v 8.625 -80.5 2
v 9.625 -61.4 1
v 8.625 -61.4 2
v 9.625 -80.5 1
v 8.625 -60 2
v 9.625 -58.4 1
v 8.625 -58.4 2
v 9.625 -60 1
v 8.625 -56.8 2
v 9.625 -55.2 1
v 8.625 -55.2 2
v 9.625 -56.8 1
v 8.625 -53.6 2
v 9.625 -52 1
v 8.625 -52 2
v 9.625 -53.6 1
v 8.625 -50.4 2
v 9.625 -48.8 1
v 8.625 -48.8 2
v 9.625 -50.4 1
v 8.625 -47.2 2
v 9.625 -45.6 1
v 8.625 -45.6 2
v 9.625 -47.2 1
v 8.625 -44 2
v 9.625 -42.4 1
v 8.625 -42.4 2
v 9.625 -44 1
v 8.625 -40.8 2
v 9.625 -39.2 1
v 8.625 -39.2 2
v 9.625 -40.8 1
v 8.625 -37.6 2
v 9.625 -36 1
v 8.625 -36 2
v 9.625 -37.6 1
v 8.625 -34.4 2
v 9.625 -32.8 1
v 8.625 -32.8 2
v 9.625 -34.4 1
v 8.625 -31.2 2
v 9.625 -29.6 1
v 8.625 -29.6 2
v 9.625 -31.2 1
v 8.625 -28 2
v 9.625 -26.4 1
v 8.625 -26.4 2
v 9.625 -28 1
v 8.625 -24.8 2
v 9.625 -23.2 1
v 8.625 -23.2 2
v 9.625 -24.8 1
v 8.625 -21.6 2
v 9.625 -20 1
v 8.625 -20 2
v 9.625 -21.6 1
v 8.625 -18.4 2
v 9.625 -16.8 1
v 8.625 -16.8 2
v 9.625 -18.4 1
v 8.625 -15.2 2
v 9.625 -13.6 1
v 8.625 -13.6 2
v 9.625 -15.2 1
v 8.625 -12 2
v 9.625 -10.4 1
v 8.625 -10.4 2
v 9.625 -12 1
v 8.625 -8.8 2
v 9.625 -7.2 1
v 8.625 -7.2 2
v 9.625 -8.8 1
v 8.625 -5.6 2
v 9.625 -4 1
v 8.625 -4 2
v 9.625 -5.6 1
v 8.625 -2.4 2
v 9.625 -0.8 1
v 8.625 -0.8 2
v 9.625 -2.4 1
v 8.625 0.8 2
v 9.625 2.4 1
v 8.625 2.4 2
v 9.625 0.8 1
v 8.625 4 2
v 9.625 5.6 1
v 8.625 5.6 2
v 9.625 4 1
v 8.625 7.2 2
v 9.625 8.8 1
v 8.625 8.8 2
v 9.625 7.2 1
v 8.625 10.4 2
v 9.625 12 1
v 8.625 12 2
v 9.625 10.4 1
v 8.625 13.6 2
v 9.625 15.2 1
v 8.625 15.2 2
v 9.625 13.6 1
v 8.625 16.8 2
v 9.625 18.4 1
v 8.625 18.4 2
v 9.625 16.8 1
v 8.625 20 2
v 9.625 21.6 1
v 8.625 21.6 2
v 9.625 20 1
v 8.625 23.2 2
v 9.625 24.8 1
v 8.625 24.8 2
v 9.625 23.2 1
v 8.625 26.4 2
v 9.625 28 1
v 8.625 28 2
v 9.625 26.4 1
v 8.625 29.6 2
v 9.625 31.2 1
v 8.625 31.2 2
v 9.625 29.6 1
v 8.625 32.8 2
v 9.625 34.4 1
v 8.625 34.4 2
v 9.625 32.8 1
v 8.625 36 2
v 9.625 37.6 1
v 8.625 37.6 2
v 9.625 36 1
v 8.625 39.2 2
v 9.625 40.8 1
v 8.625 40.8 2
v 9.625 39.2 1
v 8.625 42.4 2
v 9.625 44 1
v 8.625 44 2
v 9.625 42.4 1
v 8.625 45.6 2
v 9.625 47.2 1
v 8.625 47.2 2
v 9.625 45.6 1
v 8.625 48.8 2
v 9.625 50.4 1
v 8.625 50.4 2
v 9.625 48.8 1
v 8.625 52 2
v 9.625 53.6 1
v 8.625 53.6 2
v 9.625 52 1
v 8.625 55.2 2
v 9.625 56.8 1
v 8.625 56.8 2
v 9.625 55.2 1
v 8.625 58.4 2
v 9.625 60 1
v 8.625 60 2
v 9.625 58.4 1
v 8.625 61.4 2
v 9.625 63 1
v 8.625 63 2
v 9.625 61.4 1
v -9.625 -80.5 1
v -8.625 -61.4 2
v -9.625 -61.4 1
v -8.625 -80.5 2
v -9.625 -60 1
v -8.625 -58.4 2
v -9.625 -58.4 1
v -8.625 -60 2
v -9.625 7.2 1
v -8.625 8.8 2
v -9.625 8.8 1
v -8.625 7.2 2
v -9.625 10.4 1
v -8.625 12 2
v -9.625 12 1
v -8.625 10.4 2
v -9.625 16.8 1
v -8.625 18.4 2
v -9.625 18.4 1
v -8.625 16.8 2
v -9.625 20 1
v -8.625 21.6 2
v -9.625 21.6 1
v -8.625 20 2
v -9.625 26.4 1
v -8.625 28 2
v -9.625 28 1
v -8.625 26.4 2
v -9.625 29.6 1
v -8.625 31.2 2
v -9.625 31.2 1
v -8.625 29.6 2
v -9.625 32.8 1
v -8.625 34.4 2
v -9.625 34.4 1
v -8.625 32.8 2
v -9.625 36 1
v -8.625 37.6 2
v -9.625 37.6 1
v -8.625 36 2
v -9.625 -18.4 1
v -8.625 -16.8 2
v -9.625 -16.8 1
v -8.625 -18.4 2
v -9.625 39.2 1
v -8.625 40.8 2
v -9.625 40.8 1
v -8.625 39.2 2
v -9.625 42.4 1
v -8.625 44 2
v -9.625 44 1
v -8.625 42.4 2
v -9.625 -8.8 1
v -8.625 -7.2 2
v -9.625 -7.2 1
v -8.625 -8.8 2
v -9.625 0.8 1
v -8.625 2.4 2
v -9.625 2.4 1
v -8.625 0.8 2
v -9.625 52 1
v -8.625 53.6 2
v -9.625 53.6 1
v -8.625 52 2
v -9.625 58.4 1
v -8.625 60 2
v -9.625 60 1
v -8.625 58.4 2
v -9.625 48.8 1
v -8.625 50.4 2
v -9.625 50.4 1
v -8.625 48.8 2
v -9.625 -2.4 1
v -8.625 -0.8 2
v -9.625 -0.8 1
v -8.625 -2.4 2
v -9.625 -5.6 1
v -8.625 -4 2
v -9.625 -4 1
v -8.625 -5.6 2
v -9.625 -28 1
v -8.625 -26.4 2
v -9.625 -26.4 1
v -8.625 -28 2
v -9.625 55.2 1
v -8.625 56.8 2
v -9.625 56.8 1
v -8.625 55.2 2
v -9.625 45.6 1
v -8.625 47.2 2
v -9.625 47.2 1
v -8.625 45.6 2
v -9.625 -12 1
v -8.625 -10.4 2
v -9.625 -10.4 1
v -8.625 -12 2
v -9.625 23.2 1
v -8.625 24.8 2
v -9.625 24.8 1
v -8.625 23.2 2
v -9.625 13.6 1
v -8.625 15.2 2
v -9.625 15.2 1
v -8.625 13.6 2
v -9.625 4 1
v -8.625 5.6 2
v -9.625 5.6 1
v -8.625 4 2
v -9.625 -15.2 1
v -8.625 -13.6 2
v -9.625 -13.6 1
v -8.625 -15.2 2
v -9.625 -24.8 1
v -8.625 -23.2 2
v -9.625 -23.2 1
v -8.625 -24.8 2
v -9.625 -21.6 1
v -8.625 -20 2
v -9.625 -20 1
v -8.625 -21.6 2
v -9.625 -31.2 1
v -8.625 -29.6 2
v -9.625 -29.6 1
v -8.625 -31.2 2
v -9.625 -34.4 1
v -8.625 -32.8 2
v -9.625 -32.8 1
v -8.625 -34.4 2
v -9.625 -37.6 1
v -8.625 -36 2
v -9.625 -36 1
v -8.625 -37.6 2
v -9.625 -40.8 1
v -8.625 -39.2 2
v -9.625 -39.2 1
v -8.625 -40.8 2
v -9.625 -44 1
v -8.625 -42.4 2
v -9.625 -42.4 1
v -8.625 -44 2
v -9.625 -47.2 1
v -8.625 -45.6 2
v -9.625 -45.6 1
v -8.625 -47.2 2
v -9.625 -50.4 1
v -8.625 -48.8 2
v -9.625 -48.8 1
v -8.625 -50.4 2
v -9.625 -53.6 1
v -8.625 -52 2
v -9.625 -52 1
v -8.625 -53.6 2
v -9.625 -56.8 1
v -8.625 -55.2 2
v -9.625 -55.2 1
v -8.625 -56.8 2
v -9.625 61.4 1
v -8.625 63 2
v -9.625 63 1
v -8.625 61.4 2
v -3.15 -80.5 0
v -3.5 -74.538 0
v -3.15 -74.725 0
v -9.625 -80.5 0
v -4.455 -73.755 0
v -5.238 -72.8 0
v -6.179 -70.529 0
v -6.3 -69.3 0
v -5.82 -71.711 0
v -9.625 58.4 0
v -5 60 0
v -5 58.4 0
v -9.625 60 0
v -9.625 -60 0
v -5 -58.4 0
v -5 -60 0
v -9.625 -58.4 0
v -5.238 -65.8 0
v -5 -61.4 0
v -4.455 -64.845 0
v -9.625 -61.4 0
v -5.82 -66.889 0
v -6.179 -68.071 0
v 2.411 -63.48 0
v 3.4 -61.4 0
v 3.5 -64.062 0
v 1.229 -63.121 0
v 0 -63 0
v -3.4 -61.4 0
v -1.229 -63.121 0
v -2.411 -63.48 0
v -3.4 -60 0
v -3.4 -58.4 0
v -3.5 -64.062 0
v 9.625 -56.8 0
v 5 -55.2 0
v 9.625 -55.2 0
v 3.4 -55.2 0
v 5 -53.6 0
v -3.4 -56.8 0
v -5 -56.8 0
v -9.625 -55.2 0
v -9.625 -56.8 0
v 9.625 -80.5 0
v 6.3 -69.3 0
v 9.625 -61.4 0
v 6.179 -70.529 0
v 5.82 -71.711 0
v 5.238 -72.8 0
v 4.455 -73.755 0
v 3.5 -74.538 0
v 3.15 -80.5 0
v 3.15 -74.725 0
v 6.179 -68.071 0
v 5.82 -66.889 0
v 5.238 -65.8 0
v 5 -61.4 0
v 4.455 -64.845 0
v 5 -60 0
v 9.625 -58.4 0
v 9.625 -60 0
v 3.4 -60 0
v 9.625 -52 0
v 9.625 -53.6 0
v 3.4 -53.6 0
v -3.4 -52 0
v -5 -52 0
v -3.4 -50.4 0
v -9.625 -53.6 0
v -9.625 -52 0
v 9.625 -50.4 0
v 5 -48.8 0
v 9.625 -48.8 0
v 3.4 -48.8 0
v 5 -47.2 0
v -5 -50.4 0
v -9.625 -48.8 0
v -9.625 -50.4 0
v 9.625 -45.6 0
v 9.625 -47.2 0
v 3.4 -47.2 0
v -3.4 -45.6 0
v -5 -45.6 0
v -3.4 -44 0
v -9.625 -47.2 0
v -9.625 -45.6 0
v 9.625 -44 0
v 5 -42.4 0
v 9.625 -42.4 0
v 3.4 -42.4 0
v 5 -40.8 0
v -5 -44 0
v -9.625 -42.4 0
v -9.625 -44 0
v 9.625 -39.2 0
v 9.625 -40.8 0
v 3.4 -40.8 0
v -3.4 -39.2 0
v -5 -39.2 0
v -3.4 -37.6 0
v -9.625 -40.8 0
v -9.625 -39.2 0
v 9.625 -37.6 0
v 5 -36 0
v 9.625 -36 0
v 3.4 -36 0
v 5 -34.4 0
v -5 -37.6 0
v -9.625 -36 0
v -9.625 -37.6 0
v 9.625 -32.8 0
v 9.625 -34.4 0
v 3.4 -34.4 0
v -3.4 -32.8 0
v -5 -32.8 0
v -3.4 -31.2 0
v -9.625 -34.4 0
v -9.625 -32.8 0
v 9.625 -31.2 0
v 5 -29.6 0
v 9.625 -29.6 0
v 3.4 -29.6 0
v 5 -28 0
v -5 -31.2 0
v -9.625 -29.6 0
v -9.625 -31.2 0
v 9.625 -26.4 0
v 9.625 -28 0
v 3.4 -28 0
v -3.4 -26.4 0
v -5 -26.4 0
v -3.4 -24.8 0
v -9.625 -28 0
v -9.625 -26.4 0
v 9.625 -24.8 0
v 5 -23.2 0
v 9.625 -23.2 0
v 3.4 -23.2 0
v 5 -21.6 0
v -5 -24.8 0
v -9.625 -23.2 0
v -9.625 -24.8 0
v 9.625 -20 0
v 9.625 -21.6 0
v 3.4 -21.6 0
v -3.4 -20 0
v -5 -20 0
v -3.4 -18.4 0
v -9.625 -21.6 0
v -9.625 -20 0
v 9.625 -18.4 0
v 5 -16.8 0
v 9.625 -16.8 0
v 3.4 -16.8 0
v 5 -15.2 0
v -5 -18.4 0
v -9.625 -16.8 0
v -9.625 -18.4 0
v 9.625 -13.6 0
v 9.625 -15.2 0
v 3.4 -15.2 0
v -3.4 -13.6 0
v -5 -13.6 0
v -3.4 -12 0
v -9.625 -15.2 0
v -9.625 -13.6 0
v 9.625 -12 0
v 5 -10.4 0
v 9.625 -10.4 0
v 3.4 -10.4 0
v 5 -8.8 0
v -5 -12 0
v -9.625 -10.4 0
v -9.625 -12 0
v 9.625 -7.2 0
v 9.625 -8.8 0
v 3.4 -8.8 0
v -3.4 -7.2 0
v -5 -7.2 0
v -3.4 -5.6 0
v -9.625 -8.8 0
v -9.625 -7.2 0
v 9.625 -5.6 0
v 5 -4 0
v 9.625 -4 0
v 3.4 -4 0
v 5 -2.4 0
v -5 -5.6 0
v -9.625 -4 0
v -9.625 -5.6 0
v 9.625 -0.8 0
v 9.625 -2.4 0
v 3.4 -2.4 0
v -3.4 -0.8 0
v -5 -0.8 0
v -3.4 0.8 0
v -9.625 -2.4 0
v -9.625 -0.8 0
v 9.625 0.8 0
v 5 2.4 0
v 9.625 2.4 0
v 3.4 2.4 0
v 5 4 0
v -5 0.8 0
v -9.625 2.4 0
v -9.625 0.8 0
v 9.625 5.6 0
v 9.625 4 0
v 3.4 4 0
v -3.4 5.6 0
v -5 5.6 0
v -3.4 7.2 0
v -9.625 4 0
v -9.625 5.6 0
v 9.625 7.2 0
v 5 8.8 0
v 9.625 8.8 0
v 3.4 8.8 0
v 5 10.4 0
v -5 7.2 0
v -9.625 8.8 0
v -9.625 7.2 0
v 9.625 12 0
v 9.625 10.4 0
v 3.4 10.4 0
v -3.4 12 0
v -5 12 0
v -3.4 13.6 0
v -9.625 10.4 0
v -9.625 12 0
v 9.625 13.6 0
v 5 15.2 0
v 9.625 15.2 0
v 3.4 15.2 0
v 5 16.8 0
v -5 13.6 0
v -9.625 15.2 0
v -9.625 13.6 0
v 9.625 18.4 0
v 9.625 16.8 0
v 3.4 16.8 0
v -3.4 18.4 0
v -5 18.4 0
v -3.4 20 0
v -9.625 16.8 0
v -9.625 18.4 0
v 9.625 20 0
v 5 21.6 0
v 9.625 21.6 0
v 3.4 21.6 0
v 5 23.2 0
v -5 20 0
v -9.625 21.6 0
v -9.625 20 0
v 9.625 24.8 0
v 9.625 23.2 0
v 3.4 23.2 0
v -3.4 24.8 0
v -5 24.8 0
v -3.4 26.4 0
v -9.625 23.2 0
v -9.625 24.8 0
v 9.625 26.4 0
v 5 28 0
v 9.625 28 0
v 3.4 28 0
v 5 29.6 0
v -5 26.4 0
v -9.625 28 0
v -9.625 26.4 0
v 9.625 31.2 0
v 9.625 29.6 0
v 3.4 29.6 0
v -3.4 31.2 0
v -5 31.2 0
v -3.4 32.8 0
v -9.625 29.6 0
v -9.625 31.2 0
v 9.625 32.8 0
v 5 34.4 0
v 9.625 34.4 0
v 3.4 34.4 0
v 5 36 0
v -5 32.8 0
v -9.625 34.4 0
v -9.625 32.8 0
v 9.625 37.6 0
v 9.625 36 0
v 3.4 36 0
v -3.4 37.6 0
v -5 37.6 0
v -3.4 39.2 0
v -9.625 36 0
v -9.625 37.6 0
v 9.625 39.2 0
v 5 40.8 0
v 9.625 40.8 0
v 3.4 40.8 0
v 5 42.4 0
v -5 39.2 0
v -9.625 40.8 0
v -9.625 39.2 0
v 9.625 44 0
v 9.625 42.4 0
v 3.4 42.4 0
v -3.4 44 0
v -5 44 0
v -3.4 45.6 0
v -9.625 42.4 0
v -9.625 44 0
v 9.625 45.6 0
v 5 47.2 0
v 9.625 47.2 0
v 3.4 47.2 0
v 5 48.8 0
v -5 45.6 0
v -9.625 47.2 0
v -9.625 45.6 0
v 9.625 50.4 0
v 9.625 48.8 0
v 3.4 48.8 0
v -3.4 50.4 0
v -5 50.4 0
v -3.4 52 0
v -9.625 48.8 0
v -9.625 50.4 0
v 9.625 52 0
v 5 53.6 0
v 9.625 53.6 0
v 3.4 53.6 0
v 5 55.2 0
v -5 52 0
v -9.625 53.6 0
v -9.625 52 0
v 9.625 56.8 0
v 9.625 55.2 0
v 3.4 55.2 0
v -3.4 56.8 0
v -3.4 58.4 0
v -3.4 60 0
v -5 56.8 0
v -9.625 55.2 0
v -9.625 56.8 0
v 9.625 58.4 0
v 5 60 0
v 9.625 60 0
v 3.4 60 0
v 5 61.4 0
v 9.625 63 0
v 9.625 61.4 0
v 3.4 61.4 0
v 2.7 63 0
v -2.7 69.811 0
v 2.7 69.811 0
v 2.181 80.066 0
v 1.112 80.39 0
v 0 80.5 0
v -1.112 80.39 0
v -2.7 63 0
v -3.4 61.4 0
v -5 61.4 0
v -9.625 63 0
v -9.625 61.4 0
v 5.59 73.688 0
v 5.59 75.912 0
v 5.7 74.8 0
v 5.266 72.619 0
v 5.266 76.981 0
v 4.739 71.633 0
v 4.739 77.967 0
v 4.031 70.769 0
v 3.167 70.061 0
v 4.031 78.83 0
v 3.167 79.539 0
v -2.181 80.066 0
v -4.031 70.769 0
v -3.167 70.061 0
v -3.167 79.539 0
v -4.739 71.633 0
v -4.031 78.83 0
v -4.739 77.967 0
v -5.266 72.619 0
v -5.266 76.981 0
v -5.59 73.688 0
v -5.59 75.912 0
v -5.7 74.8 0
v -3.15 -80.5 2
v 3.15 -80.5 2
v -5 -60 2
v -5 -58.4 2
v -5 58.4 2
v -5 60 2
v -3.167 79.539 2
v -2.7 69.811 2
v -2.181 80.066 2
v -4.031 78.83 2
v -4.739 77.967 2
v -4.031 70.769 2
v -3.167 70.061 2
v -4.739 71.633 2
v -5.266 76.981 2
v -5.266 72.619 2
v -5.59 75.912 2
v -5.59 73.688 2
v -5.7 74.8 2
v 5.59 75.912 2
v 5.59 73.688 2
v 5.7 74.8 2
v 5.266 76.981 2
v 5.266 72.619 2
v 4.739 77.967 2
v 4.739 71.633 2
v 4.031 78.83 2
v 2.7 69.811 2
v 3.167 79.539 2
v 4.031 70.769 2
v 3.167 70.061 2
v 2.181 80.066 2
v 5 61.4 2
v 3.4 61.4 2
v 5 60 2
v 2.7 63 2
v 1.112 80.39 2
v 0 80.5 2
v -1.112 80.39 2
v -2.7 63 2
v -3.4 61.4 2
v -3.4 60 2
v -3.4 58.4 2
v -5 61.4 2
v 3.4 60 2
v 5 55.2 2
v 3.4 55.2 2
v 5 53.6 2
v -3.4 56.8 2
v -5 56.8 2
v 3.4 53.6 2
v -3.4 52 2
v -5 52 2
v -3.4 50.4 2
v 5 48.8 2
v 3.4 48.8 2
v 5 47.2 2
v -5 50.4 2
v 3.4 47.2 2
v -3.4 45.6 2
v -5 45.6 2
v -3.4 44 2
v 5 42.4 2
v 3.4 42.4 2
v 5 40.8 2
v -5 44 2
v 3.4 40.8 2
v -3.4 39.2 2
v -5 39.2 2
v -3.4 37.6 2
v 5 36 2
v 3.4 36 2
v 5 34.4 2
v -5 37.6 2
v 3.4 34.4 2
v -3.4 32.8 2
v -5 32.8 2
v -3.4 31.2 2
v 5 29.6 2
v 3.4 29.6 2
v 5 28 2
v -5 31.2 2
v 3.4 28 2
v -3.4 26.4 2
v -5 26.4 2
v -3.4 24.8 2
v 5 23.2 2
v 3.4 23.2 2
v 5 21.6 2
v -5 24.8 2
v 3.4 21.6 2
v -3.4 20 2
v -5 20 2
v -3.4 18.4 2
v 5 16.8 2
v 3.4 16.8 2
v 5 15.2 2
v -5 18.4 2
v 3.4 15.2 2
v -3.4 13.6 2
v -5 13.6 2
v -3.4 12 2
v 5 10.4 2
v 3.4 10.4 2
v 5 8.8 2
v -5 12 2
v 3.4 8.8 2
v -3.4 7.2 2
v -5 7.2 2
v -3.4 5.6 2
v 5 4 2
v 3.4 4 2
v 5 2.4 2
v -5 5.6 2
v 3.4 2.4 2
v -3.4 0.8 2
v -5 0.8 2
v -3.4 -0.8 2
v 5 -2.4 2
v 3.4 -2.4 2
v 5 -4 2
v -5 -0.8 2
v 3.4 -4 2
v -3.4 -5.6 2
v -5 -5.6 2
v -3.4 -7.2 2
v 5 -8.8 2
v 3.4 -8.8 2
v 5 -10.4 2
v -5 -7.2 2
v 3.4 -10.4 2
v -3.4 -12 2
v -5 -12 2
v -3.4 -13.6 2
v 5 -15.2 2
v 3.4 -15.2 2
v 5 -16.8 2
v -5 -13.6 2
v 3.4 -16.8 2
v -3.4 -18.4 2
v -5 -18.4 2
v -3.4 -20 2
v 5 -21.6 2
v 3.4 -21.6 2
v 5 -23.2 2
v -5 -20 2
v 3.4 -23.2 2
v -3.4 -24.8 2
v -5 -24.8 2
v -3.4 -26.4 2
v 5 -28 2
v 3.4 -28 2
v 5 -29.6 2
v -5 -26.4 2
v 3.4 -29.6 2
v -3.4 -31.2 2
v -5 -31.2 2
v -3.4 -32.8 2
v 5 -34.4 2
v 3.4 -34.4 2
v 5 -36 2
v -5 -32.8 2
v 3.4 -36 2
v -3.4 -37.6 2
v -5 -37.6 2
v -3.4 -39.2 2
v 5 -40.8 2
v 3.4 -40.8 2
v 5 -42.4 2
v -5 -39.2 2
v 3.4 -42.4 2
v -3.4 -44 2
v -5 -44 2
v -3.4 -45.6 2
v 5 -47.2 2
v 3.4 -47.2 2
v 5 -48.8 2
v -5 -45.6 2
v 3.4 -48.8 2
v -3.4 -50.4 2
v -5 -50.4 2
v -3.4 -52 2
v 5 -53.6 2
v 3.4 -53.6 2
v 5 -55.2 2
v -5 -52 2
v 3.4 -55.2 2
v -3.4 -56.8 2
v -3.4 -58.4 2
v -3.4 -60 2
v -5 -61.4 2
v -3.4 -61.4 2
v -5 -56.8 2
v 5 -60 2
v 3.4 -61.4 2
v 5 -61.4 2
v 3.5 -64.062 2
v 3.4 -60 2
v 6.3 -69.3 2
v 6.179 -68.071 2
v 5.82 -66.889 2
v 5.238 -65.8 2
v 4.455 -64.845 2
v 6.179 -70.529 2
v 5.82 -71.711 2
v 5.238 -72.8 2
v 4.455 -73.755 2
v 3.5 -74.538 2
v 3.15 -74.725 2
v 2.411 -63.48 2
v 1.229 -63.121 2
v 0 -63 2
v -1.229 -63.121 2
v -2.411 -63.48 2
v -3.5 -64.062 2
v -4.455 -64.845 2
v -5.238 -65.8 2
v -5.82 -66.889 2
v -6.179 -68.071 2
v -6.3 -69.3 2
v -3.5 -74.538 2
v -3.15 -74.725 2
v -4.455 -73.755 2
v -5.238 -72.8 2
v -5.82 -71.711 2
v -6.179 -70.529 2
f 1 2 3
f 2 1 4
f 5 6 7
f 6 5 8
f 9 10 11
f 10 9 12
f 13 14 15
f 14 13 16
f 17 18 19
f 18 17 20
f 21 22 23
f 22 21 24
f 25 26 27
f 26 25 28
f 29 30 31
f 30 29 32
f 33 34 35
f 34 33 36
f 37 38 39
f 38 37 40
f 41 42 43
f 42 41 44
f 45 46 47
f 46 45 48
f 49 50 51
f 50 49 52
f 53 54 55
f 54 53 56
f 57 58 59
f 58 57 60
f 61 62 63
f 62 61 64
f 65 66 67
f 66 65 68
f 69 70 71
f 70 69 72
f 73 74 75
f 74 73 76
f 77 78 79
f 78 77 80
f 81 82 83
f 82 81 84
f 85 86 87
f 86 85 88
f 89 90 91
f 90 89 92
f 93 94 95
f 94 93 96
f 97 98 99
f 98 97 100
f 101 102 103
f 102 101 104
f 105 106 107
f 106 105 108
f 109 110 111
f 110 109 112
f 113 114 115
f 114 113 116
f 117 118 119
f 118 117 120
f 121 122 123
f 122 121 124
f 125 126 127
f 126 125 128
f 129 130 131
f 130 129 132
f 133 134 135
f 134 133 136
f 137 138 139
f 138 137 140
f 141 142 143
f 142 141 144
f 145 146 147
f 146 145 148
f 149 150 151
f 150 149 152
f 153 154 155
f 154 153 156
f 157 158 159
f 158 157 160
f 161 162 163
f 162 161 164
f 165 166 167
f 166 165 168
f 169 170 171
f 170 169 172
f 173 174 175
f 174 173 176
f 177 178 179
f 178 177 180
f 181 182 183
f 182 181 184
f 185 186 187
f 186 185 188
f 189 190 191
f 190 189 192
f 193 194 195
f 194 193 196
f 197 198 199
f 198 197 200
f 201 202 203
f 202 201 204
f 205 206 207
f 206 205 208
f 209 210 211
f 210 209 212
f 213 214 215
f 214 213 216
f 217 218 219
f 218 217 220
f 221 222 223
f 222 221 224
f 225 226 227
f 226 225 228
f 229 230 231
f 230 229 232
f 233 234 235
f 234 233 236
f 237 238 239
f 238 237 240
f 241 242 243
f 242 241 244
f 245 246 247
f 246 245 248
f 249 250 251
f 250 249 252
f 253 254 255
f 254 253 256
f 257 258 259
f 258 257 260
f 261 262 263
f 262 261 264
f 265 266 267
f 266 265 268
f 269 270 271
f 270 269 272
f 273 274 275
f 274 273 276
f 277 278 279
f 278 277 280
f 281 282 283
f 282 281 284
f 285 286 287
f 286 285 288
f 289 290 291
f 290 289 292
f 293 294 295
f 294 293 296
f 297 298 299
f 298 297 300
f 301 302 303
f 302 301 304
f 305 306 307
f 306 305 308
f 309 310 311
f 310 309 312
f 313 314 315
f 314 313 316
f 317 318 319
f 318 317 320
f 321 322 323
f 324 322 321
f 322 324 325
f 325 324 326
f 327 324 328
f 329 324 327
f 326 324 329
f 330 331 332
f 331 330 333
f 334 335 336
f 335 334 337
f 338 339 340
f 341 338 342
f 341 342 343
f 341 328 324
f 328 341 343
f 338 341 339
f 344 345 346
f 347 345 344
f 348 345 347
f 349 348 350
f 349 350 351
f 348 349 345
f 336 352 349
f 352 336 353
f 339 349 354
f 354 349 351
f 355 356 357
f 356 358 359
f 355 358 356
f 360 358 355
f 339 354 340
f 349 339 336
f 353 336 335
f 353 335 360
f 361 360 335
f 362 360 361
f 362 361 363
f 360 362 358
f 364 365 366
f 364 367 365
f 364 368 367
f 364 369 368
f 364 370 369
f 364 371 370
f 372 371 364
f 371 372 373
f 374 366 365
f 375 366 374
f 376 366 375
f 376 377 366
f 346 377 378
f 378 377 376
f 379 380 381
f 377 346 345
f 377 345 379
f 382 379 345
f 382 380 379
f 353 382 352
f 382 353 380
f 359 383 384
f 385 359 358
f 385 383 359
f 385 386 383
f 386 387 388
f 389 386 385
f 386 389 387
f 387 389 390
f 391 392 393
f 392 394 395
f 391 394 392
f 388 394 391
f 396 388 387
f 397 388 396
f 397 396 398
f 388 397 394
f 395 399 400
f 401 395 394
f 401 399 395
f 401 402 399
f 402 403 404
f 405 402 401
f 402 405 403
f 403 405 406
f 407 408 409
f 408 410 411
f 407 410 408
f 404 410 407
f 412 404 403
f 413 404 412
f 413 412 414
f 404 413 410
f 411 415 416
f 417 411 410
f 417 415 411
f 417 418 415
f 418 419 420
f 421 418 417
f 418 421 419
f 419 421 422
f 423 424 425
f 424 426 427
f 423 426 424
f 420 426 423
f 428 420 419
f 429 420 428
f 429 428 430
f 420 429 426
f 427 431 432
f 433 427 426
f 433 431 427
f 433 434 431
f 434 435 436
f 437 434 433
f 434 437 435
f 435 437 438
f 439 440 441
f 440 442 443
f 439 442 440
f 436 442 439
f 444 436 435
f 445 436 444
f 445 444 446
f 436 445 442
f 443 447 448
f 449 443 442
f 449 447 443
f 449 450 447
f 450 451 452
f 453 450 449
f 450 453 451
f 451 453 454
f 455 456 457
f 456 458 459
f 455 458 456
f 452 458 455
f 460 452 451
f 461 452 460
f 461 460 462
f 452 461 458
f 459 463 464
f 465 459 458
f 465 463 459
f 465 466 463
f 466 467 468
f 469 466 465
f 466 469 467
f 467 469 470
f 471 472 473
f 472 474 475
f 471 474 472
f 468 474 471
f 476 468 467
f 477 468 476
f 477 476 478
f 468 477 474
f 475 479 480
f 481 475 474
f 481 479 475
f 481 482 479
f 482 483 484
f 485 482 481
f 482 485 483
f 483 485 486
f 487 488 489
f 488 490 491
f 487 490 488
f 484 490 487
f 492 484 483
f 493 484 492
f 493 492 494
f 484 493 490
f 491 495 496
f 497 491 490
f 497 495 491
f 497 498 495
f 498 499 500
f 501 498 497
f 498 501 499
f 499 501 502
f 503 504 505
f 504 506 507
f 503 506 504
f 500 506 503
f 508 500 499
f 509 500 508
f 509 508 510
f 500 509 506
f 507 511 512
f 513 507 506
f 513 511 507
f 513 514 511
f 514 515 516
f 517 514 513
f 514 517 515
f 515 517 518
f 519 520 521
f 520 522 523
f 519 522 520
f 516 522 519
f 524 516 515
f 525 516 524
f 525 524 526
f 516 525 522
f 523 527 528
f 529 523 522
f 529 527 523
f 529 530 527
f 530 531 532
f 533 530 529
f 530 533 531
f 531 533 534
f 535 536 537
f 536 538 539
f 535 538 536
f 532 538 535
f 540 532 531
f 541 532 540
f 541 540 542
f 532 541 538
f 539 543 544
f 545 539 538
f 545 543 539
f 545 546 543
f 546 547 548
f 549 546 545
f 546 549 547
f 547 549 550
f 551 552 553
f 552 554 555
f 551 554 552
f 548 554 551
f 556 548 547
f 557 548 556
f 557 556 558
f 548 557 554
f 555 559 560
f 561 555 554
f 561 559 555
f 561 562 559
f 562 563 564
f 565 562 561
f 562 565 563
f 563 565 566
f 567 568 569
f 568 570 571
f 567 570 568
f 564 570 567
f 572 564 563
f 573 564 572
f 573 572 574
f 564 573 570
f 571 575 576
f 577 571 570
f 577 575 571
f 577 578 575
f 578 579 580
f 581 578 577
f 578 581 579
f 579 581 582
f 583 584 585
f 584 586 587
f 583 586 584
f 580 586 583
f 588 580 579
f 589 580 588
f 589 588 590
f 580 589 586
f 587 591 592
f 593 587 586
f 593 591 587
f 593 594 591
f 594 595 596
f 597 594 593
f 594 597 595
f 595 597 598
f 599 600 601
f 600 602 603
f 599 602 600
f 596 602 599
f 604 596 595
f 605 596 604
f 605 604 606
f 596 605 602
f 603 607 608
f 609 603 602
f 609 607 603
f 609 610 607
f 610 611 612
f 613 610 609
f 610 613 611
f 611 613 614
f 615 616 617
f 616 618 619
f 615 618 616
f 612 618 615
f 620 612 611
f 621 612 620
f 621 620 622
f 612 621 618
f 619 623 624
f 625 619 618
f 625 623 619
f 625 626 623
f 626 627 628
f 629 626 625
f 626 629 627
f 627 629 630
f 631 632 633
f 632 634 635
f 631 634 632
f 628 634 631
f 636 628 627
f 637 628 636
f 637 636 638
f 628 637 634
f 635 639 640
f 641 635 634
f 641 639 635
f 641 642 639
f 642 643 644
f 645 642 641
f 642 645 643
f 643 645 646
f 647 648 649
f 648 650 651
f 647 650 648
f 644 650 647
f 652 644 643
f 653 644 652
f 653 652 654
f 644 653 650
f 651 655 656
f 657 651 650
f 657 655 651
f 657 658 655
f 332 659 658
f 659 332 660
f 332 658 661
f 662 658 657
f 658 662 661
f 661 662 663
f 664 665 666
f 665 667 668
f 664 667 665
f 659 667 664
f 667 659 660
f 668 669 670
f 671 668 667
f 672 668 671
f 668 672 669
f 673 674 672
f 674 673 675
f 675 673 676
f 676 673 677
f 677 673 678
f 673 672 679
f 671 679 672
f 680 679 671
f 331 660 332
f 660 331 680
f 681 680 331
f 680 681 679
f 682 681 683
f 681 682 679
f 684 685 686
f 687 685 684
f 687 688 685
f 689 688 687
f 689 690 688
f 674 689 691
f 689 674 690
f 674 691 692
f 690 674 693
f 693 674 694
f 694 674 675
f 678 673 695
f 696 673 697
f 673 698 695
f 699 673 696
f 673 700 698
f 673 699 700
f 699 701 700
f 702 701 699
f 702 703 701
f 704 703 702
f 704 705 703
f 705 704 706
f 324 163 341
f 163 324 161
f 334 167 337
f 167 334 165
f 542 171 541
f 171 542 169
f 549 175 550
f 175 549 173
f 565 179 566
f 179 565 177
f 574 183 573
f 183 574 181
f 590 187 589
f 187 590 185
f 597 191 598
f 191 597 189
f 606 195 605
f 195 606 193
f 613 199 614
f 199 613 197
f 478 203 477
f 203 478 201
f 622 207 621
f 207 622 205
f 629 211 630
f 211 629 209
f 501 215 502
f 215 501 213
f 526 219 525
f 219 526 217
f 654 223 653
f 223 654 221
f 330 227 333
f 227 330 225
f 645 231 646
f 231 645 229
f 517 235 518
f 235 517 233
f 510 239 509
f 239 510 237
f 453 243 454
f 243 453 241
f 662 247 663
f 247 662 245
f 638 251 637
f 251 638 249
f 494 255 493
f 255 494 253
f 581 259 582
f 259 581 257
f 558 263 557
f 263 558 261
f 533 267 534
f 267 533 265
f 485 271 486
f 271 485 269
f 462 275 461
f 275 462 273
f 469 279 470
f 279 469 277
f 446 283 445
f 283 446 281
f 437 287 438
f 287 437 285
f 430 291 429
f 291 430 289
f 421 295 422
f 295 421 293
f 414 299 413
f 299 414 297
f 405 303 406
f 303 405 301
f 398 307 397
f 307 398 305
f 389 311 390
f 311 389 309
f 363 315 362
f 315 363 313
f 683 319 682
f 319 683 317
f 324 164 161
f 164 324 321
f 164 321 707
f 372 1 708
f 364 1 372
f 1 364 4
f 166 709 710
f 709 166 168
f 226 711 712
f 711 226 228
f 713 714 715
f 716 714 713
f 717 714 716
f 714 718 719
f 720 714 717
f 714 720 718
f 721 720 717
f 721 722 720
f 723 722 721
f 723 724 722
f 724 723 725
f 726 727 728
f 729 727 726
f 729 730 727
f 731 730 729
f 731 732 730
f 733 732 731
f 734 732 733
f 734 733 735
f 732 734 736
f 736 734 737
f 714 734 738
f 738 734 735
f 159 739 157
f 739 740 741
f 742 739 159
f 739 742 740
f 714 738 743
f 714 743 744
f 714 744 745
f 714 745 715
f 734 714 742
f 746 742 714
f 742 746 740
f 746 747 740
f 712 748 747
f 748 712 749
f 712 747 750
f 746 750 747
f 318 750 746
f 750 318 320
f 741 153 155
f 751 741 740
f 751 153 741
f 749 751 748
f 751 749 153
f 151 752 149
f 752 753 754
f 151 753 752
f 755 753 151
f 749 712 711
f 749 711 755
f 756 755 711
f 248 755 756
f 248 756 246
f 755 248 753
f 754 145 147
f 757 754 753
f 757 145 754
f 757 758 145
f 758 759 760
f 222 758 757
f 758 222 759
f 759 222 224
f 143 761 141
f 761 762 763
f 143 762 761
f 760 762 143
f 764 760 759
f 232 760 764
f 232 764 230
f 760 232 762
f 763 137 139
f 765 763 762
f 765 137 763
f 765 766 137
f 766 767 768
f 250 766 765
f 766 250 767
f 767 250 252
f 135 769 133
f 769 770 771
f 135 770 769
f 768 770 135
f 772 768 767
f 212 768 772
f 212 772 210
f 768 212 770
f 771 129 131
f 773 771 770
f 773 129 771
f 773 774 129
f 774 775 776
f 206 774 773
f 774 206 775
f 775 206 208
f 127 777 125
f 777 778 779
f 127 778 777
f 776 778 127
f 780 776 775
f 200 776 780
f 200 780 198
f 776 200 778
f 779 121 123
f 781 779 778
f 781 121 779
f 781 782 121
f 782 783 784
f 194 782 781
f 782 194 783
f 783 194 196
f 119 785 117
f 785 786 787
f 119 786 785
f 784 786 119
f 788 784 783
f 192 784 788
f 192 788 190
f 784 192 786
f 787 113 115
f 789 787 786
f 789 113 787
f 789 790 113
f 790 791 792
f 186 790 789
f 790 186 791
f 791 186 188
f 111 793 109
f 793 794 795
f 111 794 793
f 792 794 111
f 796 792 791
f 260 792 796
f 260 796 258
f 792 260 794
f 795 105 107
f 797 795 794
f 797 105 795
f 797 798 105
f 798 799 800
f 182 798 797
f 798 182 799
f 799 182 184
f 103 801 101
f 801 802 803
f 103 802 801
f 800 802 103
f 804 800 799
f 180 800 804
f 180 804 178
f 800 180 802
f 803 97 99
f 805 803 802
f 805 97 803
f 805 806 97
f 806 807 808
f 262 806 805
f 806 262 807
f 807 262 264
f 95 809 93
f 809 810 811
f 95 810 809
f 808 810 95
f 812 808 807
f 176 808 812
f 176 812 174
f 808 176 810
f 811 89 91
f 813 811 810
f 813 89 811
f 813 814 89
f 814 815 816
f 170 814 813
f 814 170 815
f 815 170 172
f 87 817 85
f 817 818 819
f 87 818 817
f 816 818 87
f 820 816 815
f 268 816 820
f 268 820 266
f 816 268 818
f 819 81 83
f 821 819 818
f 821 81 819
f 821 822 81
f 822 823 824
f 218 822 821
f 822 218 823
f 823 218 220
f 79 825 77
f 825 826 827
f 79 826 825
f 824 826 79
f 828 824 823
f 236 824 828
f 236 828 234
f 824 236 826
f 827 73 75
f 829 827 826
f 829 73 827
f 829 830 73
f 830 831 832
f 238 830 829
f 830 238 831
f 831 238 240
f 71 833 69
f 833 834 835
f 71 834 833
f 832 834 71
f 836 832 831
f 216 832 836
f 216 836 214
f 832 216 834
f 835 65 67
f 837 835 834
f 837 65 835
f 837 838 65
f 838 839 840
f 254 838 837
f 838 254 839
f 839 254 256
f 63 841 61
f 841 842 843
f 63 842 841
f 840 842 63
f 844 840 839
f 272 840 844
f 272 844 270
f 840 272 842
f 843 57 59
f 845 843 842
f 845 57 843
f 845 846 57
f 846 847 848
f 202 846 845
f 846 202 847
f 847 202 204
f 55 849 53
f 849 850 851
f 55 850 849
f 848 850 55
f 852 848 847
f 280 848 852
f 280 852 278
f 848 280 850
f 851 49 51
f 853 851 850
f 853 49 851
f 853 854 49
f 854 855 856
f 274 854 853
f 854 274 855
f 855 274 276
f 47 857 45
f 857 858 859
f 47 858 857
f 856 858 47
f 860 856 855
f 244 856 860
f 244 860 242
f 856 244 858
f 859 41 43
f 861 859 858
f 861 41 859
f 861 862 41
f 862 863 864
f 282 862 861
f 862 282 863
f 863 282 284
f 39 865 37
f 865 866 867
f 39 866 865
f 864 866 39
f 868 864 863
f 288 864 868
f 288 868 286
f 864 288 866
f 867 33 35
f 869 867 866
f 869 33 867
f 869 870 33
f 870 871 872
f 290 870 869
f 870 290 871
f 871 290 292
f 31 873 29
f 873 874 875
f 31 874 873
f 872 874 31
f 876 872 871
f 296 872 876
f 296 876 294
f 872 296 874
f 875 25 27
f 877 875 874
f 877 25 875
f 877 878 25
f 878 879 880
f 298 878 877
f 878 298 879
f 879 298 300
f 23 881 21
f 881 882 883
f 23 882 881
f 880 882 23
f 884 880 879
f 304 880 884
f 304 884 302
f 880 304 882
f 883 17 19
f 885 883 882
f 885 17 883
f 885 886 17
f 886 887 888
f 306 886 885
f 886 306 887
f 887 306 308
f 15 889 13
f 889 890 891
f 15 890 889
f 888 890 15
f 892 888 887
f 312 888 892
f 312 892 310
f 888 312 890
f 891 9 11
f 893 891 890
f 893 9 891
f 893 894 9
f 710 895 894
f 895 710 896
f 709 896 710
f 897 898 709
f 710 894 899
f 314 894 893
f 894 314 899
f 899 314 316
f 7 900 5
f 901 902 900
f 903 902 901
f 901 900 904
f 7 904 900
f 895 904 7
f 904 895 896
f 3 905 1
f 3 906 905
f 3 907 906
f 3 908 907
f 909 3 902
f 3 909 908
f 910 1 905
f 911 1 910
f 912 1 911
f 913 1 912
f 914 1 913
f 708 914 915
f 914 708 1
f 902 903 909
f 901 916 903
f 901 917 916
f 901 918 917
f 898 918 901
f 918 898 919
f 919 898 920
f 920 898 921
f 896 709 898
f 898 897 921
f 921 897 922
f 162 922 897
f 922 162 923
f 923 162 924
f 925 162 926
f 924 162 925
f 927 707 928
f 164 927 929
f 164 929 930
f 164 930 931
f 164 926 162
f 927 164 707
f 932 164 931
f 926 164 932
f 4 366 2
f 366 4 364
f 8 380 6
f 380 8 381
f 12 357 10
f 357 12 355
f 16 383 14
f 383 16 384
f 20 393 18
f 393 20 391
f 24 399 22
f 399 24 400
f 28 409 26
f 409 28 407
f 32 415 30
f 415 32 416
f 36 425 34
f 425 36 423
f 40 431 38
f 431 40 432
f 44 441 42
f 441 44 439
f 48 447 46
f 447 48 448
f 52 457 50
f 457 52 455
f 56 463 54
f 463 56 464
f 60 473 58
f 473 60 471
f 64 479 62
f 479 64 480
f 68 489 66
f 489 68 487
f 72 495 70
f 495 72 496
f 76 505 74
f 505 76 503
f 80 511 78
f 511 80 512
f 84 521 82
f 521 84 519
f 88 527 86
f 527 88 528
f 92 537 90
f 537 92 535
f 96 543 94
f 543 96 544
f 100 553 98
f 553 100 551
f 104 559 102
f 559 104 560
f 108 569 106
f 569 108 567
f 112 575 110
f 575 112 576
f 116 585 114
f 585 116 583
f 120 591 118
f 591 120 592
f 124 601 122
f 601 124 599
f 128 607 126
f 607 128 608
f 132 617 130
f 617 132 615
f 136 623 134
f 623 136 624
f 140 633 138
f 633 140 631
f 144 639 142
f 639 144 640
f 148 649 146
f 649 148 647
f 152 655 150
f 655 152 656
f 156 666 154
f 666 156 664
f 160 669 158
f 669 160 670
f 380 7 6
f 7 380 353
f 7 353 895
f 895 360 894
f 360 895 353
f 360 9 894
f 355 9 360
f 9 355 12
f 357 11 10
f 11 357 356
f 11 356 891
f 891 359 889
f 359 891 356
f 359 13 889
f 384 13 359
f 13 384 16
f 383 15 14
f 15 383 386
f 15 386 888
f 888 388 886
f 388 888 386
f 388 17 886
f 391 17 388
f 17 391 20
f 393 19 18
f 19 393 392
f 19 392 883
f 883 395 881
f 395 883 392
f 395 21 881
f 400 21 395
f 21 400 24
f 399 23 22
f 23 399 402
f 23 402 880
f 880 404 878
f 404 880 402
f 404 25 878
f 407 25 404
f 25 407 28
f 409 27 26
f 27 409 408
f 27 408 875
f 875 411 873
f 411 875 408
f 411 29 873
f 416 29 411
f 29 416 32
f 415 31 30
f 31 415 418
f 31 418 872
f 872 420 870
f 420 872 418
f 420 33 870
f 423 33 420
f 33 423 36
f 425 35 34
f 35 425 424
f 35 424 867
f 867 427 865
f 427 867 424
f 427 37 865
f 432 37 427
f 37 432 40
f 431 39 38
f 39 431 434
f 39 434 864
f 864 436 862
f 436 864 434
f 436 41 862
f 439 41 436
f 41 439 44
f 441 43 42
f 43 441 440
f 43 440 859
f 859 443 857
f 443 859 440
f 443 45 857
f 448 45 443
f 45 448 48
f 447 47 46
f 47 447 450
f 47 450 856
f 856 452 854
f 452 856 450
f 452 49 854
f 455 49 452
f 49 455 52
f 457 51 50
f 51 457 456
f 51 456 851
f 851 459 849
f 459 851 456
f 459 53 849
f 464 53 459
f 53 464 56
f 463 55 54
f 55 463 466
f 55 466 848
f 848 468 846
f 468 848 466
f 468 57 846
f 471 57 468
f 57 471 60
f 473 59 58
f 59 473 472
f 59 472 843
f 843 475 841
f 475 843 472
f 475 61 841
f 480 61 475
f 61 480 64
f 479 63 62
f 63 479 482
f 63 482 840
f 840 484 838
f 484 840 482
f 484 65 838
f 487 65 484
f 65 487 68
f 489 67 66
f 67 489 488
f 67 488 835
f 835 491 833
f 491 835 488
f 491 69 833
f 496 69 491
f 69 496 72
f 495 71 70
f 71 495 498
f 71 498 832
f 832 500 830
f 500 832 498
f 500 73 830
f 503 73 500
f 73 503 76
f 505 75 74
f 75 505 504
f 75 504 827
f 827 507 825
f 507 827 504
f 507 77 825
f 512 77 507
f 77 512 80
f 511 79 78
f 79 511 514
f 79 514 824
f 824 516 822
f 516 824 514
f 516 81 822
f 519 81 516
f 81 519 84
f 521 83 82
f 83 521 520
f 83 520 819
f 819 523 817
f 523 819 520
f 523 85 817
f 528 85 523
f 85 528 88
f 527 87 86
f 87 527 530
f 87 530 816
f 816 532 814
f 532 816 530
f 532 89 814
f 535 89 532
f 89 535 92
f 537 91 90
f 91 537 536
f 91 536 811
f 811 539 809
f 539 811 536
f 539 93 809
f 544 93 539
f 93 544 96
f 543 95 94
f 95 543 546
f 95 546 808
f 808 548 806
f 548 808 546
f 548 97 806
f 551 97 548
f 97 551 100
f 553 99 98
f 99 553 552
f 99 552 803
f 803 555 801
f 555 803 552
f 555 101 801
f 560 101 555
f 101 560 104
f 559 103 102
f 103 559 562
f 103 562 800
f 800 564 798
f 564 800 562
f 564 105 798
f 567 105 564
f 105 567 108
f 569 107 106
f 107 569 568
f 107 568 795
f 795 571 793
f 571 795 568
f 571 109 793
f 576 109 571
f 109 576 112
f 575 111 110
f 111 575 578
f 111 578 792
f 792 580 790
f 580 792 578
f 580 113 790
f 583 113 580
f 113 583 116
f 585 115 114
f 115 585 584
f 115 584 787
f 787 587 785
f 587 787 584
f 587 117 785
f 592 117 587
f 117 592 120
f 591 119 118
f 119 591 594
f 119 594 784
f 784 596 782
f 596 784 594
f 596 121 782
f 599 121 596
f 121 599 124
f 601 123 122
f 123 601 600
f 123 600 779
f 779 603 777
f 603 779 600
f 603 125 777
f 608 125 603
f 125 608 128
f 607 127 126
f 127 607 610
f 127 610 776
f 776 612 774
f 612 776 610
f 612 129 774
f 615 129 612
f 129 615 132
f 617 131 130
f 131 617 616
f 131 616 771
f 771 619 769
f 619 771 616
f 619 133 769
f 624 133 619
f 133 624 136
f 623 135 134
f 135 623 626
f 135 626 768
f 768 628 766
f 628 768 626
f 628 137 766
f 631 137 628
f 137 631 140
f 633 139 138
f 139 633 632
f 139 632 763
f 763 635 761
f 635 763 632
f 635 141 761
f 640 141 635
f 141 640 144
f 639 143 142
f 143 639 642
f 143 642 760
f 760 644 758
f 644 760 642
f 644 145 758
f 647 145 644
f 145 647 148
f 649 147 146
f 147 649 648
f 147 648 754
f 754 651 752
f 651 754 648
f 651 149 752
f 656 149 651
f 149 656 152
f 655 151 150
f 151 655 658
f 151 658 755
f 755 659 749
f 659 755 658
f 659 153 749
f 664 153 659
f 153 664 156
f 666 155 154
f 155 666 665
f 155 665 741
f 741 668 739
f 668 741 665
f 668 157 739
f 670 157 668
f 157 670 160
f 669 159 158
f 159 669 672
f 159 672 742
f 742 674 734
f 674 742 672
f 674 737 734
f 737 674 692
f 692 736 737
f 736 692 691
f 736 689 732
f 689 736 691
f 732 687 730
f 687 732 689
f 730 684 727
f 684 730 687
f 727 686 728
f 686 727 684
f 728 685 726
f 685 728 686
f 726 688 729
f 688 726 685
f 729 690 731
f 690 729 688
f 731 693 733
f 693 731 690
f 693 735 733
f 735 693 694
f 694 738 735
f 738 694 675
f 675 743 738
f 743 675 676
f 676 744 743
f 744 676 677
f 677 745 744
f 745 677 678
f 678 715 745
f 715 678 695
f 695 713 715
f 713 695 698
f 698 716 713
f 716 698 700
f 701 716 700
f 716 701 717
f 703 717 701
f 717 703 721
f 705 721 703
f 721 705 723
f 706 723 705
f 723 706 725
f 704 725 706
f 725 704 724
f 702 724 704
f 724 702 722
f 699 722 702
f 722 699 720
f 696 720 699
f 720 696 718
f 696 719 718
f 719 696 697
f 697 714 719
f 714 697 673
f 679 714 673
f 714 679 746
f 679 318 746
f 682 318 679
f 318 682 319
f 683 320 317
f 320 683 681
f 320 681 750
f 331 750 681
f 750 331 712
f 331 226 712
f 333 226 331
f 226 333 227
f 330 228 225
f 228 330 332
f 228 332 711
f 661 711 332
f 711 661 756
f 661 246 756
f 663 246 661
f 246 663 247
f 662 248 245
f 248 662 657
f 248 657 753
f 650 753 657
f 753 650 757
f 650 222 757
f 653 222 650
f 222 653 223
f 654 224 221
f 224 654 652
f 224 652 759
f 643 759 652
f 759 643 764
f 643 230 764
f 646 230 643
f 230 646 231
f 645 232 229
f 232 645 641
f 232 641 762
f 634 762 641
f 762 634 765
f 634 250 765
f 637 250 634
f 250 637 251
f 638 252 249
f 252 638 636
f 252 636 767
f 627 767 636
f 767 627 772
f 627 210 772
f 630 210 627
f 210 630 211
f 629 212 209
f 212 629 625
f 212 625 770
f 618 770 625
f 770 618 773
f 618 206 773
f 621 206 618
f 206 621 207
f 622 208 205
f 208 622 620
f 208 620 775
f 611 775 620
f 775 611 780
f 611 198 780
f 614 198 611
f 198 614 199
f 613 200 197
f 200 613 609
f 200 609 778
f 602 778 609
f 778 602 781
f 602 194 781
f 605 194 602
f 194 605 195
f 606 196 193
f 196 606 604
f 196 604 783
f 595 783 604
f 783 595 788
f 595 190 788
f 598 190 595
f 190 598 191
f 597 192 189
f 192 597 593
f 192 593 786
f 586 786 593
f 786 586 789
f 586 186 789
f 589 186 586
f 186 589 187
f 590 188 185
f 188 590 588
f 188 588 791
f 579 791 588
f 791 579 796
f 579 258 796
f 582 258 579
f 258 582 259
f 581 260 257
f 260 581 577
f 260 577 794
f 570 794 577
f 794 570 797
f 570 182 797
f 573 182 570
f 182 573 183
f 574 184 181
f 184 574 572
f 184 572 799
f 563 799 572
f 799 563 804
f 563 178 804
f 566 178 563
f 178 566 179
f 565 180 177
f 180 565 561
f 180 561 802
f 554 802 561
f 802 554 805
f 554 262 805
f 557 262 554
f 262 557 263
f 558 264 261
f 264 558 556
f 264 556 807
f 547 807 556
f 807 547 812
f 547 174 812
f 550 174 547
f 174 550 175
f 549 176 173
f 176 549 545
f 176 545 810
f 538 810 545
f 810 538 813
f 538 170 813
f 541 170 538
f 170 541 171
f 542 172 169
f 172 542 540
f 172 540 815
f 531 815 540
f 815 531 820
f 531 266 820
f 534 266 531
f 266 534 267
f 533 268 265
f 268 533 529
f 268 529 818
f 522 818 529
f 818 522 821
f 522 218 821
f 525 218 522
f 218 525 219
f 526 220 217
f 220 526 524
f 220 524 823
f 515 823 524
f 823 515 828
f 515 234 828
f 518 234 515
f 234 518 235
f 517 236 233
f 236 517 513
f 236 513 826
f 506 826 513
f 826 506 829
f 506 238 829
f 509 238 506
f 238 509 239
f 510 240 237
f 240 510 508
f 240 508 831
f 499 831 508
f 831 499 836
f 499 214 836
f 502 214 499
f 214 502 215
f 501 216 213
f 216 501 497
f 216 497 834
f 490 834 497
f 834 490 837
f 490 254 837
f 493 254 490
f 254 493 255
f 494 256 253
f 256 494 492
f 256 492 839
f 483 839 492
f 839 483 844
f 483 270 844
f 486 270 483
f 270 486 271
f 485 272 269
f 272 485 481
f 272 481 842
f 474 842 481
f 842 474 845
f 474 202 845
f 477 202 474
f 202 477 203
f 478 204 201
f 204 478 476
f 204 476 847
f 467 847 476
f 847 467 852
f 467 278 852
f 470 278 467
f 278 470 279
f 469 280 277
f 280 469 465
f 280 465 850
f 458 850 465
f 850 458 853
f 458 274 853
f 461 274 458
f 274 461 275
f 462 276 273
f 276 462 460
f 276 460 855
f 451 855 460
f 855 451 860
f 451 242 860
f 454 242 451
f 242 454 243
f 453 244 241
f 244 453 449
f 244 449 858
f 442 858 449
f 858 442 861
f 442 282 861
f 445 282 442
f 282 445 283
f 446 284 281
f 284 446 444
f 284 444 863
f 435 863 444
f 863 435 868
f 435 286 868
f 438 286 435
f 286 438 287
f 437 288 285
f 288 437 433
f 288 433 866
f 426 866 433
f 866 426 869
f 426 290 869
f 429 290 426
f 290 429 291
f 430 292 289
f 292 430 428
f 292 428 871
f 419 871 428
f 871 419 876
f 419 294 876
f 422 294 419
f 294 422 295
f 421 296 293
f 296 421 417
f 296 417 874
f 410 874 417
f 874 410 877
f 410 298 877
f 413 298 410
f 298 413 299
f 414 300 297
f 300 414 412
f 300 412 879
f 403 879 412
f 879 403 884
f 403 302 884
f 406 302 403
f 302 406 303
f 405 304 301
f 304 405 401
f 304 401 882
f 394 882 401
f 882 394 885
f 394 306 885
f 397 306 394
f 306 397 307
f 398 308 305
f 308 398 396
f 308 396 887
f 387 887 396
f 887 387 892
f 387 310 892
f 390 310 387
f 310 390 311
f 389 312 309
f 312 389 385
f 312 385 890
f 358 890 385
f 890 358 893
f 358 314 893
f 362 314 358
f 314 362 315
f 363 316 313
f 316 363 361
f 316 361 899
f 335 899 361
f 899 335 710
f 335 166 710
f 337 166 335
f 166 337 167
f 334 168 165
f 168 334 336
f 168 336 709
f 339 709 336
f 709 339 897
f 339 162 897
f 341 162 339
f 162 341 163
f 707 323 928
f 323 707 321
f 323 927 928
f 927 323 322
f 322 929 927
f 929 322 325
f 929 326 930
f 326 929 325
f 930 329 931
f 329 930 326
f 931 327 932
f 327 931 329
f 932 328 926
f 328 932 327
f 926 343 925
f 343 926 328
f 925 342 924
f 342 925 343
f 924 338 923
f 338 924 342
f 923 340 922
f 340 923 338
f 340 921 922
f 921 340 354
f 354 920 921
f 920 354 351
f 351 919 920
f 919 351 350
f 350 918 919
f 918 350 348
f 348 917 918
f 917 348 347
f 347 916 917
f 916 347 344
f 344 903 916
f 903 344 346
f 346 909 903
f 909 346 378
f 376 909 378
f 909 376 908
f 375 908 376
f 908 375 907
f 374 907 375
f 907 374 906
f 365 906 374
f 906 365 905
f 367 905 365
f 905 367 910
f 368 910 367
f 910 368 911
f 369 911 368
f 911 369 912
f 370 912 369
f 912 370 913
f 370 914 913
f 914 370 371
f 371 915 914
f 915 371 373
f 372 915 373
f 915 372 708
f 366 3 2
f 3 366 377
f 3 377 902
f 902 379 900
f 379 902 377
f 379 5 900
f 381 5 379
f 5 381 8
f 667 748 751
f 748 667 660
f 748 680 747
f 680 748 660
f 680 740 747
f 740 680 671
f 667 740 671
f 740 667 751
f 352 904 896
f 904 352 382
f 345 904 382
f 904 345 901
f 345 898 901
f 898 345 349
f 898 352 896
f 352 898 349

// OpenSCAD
// Customizable toy train tracks
// by atartanian (www.thingiverse.com/atartanian)
// license CC-BY-SA

// preview[view:west, tilt:top]

/*[Track Settings]*/
//length of track piece, in mm
length = 161; //[30:10:400] //inklusive the male pin

//only one preset... for now
//track_type = 0; //[1:brio,0:custom]

//in order to print perfectly, set your printers extrusion width
extrusion_width = .4; //[.1:.05:1]

//track line thickness, in multiples of extrusion width
line_thickness = 4; //[2:2:10]

//spacing between male and female connectors, in mm
connector_tolerance = .3; //[.1:.05:1]

/*[Custom Dimensions]*/
use_custom_settings = 1; //[0:No,1:Yes]
custom_width_base = 19.25;
custom_width_middle = 10;
custom_height_base = 2;
custom_height_middle = 2;
custom_connector_length = 17.5;

/*[Hidden]*/
track_type = use_custom_settings ? 0 : 1;


/***************/
/*     CODE    */
/***************/
translate([-track_type_params()[track_type][1] / 2, -length / 2])
intersection(convexity = 20) {
    rotate([-90,0,0])
        linear_extrude(height = length, convexity = 20)
            scale([1,-1])
                track_profile_2D(
                    track_type_params()[track_type][1],
                    track_type_params()[track_type][2],
                    track_type_params()[track_type][3],
                    track_type_params()[track_type][4],
                    1
                );

    linear_extrude(height = track_type_params()[track_type][4], convexity = 20)
        union() {
            translate([0, track_type_params()[track_type][5] + line_thickness * extrusion_width]) {
                translate([track_type_params()[track_type][1] / 2, length - track_type_params()[track_type][5] * 2 - line_thickness * extrusion_width * 2])
                        brio_male_2D();
                
                flex_track_pattern_2D(
                    length - track_type_params()[track_type][5] * 2 - line_thickness * extrusion_width * 2,
                    track_type_params()[track_type][1],
                    track_type_params()[track_type][2],
                    line_thickness * extrusion_width,
                    line_thickness * extrusion_width,
                    line_thickness * extrusion_width
                );
            }
            translate([track_type_params()[track_type][1] / 2, track_type_params()[track_type][5] + line_thickness * extrusion_width])
                scale([1, -1])
                    brio_female_2D();
        }
}

/***************/
/*  FUNCTIONS  */
/***************/

function track_type_params() = 
[   
    [   //[0] template
        "custom",   //[0] name
        custom_width_base,         //[1] width base
        custom_width_middle,         //[2] width middle
        custom_height_base,         //[3] height base
        custom_height_middle,         //[4] height middle
        custom_connector_length
    ], 
    [   //[1] brio
        "brio",     //[0] name
        40,         //[1] width base
        20,         //[2] width middle
        8.9,        //[3] height base
        12,         //[4] height middle
        17.5        //[5] connector length
    ], 
];

/***************/
/*   MODULES   */
/***************/

module track_profile_2D(
    width_base = 40,
    width_middle = 20,
    height_base = 10,
    height_middle = 15,
    bevel_radius = 1
){
    difference() {
        translate([bevel_radius, 0]) {
            union() {
                offset(d = bevel_radius) {
                    square(
                        [
                            width_base - bevel_radius * 2,
                            height_base - bevel_radius
                        ]
                    );
                }
                offset(d = bevel_radius) {
                    translate([(width_base - width_middle) / 2, bevel_radius])
                        square(
                            [
                                width_middle - bevel_radius * 2,
                                height_middle - bevel_radius * 2
                            ]
                        );
                }            
            }
        }
        translate([-width_base/2, -width_base*2])
            square(width_base * 2);
    }   
}

module flex_track_pattern_2D(
    length = 100,
    width_base = 40,
    width_middle = 20,
    line_thickness = 1.6,
    connector_thickness = 1.6,
    gap_thickness = 1.6
){
    epsilon = .1;

    slice_thickness = line_thickness + gap_thickness;
    slices = floor(length / slice_thickness);
    leftover = length - (slice_thickness * slices) + gap_thickness;

    module bars(even = true, odd = true, cutter = false) {
        for (i = [0:slices-1]) {
            if (even == true && !(i % 2)) {
                if(cutter == true) {
                    translate([-epsilon/2,slice_thickness * i]) {
                        square([width_base + epsilon,line_thickness]);
                    }
                } else {
                    translate([0,slice_thickness * i]) {
                        square([width_base,line_thickness]);
                    }
                }  
            }
            if (odd == true && (i % 2)) {
                if(cutter == true) {
                    translate([-epsilon/2,slice_thickness * i]) {
                        square([width_base + epsilon,line_thickness]);
                    }
                } else {
                    translate([0,slice_thickness * i]) {
                        square([width_base,line_thickness]);
                    }
                }  
            }
        }
    }

    module bars_holes(even = true, odd = true, cutter = true) {
        for (i = [0:slices-2]) {
            if (even == true && !(i % 2)) {
                if(cutter == true) {
                    translate([-epsilon/2,slice_thickness * i + line_thickness]) {
                        square([width_base + epsilon, gap_thickness]);
                    }
                } else {
                    translate([0,slice_thickness * i + line_thickness]) {
                        square([width_base, gap_thickness]);
                    }
                }  
            }
            if (odd == true && (i % 2)) {
                if(cutter == true) {
                    translate([-epsilon/2,slice_thickness * i + line_thickness]) {
                        square([width_base + epsilon, gap_thickness]);
                    }
                } else {
                    translate([0,slice_thickness * i + line_thickness]) {
                        square([width_base, gap_thickness]);
                    }
                }  
            }
        }
    }

    translate([0, leftover / 2])
        bars();

    difference() {
        translate([(width_base - width_middle) / 2, 0])
            square([connector_thickness, length]);
        
        translate([0, leftover / 2])
            bars_holes(false, true);
    }

    difference() {
        translate([(width_base - width_middle) / 2 + width_middle - connector_thickness, 0])
            square([connector_thickness, length]);
        
        translate([0, leftover / 2])
            bars_holes(true, false);
    } 
}

module brio_male_2D() {
    stem_width = 6;
    stem_length = 11.5;
    post_radius = 6;

    translate([0, line_thickness * extrusion_width/2])
        square([track_type_params()[1][1], line_thickness * extrusion_width], center = true);
    
    translate([0, (stem_length + connector_tolerance) / 2 + line_thickness * extrusion_width])
        square([stem_width - connector_tolerance * 2, stem_length + connector_tolerance], center = true);
    
    translate([0, stem_length + connector_tolerance + line_thickness * extrusion_width])
        circle(r = post_radius - connector_tolerance, $fn = 32);
}

module brio_female_2D() {
    stem_width = 6.3;
    stem_length = 11.5;
    post_radius = 6.3;
    total_length = line_thickness * extrusion_width + stem_length + post_radius;

    difference() {
        translate([0, (total_length)/2])
            square([track_type_params()[1][1], total_length], center = true);
        
        translate([0, total_length - stem_length / 2])
            square([stem_width, stem_length], center = true);
        
        translate([0, total_length - stem_length])
            circle(r = post_radius, $fn = 32);        
    }

}
